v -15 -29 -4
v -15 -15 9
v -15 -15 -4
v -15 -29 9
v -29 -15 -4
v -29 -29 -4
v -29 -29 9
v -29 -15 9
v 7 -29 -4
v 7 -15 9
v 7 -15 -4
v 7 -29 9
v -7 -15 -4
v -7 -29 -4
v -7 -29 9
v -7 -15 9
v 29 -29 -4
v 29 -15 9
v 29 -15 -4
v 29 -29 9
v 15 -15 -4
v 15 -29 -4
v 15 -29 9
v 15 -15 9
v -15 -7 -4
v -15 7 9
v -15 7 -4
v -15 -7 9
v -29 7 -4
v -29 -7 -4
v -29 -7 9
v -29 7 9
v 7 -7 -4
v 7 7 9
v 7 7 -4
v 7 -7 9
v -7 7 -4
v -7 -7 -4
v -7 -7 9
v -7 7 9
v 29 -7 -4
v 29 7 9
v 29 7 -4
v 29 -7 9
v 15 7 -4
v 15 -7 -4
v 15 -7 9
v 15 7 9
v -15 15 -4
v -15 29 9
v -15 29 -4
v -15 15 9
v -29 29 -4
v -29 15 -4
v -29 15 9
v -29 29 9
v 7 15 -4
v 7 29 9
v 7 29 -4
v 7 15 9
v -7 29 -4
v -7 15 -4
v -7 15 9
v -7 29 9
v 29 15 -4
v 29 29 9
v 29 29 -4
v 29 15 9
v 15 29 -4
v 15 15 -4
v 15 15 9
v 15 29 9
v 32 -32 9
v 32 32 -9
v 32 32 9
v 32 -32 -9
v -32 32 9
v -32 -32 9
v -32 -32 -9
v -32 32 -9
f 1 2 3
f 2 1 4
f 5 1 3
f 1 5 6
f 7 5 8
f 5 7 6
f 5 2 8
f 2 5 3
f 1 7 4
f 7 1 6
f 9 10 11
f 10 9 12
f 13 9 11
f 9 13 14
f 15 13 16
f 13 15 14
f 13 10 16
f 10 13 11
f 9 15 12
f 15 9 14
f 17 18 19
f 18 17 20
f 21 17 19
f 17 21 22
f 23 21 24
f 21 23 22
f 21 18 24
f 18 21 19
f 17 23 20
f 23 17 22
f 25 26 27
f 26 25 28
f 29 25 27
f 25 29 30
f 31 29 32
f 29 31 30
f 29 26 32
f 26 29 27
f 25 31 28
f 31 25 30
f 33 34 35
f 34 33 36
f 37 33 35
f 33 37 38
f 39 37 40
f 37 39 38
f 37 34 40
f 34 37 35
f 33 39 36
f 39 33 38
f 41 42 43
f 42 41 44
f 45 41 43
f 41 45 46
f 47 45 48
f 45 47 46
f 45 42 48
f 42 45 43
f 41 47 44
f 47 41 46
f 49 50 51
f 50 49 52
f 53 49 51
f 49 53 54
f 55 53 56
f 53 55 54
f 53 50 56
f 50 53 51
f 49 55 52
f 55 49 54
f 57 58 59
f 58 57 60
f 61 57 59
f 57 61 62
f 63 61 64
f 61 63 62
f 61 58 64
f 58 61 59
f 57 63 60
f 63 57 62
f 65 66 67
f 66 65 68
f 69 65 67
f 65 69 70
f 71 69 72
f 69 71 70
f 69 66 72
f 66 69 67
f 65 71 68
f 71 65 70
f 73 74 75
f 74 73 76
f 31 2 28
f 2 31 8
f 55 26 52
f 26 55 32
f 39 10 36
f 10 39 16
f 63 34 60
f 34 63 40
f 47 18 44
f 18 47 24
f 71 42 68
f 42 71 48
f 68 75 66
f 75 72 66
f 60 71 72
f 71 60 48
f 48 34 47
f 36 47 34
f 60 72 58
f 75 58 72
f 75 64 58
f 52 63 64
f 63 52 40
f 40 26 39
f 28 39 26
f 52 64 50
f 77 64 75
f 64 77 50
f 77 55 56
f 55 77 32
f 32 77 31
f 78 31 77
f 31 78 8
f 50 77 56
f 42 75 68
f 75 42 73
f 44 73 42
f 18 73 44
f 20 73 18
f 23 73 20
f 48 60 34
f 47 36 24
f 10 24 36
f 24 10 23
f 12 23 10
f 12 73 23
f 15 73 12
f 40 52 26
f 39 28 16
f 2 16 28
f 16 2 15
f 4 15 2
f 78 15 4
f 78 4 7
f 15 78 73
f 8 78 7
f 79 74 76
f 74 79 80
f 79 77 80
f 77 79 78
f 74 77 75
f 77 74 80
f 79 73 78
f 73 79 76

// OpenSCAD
$fn = 32;

// ----------------------------------------------------------------------
// Pocket plate 64 x 64 x 18
// 3 x 3 pockets 14 mm square, 13 mm deep
// ----------------------------------------------------------------------

// --- parameters (mm) ---
thickness = 18;  // plate thickness
floor_t = 5;     // material left under each pocket
pocket = 14;     // pocket side length
pitch_x = 22;    // pocket pitch along X
pitch_y = 22;    // pocket pitch along Y
cols = 3;        // pockets per row
rows = 3;        // rows of pockets

// --- derived feature positions (mm) ---
depth = thickness - floor_t;        // = 13   pocket depth, down to the floor
span_x = (cols - 1) * pitch_x;      // = 44   distance between outer pockets
span_y = (rows - 1) * pitch_y;      // = 44   distance between outer pocket rows
origin_x = -span_x / 2;             // = -22   X of the first pocket
origin_y = -span_y / 2;             // = -22   Y of the first pocket
plate = [span_x + pocket + 6, span_y + pocket + 6, thickness];  // = [64, 64, 18]   overall size: pockets plus 3 mm of wall on each side
feature_centers = [
  [origin_x + 0 * pitch_x, origin_y + 0 * pitch_y],
  [origin_x + 1 * pitch_x, origin_y + 0 * pitch_y],
  [origin_x + 2 * pitch_x, origin_y + 0 * pitch_y],
  [origin_x + 0 * pitch_x, origin_y + 1 * pitch_y],
  [origin_x + 1 * pitch_x, origin_y + 1 * pitch_y],
  [origin_x + 2 * pitch_x, origin_y + 1 * pitch_y],
  [origin_x + 0 * pitch_x, origin_y + 2 * pitch_y],
  [origin_x + 1 * pitch_x, origin_y + 2 * pitch_y],
  [origin_x + 2 * pitch_x, origin_y + 2 * pitch_y]
];   // pocket centres, used verbatim by the cutter loop

// plate outline, then one pocket per centre in feature_centers
difference() {
  cube(plate, center = true);
  for (centre = feature_centers)
    translate([centre[0] - pocket / 2, centre[1] - pocket / 2, plate[2] / 2 - depth])
      cube([pocket, pocket, depth + 1]);  // centred on the declared pocket centre
}
